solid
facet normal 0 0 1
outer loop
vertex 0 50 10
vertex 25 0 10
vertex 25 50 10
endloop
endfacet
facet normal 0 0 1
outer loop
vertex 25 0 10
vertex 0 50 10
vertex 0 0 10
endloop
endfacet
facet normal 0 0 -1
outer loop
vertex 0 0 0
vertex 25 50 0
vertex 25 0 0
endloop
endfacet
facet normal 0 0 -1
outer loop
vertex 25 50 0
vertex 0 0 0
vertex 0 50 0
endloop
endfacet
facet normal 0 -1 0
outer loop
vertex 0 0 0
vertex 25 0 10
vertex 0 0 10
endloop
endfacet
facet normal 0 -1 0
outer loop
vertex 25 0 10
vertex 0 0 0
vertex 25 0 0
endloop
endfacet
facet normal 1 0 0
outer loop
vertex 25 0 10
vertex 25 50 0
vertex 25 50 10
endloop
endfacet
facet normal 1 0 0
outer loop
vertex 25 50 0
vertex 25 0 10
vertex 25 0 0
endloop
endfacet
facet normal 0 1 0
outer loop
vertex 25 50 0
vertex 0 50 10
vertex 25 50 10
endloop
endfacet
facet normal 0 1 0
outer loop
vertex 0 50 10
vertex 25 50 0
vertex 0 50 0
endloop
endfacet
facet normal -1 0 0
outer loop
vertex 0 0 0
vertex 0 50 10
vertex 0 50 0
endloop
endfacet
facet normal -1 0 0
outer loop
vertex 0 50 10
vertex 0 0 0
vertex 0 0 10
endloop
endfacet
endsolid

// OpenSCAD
module block() { // export 
  cube([25, 50, 10]);
}

block();
